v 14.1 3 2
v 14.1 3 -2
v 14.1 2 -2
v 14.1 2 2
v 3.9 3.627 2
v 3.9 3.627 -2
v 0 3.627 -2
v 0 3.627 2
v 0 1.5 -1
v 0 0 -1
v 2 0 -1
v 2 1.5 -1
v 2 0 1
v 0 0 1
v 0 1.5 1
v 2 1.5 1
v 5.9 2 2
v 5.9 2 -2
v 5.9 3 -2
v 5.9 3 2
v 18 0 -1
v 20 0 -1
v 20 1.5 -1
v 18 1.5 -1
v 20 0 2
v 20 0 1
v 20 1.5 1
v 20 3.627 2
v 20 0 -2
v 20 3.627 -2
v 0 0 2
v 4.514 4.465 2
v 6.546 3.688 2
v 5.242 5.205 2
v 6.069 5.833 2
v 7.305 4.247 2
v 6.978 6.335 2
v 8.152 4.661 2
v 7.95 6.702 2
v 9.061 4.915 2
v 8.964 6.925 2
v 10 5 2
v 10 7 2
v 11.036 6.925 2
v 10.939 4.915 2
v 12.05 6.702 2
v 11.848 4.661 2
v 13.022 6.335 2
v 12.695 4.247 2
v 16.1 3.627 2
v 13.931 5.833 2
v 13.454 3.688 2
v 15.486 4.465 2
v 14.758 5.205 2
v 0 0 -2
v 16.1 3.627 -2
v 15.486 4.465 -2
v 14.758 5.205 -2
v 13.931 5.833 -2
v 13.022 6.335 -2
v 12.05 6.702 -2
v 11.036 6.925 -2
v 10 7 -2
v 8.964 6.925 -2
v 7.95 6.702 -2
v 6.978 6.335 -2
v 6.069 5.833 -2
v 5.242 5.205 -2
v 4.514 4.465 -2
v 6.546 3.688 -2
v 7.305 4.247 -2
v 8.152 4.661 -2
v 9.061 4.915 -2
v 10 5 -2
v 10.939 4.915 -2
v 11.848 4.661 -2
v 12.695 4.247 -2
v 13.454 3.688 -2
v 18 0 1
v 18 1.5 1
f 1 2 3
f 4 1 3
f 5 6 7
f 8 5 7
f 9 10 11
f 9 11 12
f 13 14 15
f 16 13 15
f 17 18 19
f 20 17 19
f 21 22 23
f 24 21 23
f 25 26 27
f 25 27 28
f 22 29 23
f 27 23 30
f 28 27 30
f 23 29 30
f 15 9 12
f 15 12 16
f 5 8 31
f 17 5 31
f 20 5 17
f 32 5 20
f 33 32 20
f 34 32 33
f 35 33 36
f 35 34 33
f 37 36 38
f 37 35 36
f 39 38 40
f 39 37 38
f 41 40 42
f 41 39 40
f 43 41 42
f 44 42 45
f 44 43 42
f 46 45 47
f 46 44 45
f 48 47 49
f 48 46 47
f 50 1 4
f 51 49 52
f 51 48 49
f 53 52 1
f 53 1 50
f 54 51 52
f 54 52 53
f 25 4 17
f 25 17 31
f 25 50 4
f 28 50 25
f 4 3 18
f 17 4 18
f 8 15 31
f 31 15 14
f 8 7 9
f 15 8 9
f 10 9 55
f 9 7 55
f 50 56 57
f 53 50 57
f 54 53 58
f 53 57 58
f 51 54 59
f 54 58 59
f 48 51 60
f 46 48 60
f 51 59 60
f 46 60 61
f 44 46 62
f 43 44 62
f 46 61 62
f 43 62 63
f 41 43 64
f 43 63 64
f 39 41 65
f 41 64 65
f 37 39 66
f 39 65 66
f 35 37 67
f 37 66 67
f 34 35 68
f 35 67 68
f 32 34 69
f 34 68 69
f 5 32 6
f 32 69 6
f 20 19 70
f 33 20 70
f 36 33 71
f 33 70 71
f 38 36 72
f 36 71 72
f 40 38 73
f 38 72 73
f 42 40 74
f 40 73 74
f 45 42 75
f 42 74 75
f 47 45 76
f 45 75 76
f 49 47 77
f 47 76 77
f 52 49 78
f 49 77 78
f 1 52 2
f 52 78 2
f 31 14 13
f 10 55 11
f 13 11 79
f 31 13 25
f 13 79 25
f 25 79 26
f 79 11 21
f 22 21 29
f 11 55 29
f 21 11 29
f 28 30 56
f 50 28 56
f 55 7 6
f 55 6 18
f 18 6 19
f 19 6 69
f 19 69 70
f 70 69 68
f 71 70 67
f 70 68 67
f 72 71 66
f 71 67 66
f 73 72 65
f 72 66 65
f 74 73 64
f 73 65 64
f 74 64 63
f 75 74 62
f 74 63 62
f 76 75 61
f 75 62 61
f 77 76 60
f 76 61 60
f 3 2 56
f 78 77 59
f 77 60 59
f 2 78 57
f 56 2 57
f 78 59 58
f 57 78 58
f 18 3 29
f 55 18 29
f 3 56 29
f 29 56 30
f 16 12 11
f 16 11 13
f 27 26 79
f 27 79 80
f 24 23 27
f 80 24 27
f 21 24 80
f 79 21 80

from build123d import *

# Parameters (mm, degrees)
BOSS_EXTRUDE1_DEPTH      = 2
BOSS_EXTRUDE1_DEPTH_BACK = 2
SKETCH2_W                = 2
SKETCH2_H                = 1.5
CUT_EXTRUDE1_DEPTH       = 2


with BuildPart() as part:
    # Sketch1 → Boss-Extrude1 (new, two sides: drawn at the far end of the back side and taken through both)
    with BuildSketch(Plane.XY.offset(-BOSS_EXTRUDE1_DEPTH_BACK)):
        with BuildLine():
            Line((0, 0), (20, 0))
            Line((20, 0), (20, 3.627122207))
            Line((20, 3.627122207), (16.1, 3.627122207))
            ThreePointArc((16.1, 3.627122207), (10, 7), (3.9, 3.627122207))
            Line((3.9, 3.627122207), (0, 3.627122207))
            Line((0, 3.627122207), (0, 2))
            Line((0, 2), (0, 0))
        make_face()
        with BuildLine():
            Line((5.9, 2), (5.9, 3))
            ThreePointArc((5.9, 3), (10, 5), (14.1, 3))
            Line((14.1, 3), (14.1, 2))
            Line((14.1, 2), (5.9, 2))
        make_face(mode=Mode.SUBTRACT)
    extrude(amount=BOSS_EXTRUDE1_DEPTH + BOSS_EXTRUDE1_DEPTH_BACK)

    # Sketch2 → Cut-Extrude1 (cut)
    with BuildSketch(Plane.ZY):
        with Locations((0, 0.75)):
            Rectangle(SKETCH2_W, SKETCH2_H)
    cut_extrude1 = extrude(amount=-CUT_EXTRUDE1_DEPTH, mode=Mode.SUBTRACT)

    # Mirror1: Cut-Extrude1 across plane
    add(cut_extrude1.mirror(Plane.ZY.offset(-10)), mode=Mode.SUBTRACT)


solid = part.part
